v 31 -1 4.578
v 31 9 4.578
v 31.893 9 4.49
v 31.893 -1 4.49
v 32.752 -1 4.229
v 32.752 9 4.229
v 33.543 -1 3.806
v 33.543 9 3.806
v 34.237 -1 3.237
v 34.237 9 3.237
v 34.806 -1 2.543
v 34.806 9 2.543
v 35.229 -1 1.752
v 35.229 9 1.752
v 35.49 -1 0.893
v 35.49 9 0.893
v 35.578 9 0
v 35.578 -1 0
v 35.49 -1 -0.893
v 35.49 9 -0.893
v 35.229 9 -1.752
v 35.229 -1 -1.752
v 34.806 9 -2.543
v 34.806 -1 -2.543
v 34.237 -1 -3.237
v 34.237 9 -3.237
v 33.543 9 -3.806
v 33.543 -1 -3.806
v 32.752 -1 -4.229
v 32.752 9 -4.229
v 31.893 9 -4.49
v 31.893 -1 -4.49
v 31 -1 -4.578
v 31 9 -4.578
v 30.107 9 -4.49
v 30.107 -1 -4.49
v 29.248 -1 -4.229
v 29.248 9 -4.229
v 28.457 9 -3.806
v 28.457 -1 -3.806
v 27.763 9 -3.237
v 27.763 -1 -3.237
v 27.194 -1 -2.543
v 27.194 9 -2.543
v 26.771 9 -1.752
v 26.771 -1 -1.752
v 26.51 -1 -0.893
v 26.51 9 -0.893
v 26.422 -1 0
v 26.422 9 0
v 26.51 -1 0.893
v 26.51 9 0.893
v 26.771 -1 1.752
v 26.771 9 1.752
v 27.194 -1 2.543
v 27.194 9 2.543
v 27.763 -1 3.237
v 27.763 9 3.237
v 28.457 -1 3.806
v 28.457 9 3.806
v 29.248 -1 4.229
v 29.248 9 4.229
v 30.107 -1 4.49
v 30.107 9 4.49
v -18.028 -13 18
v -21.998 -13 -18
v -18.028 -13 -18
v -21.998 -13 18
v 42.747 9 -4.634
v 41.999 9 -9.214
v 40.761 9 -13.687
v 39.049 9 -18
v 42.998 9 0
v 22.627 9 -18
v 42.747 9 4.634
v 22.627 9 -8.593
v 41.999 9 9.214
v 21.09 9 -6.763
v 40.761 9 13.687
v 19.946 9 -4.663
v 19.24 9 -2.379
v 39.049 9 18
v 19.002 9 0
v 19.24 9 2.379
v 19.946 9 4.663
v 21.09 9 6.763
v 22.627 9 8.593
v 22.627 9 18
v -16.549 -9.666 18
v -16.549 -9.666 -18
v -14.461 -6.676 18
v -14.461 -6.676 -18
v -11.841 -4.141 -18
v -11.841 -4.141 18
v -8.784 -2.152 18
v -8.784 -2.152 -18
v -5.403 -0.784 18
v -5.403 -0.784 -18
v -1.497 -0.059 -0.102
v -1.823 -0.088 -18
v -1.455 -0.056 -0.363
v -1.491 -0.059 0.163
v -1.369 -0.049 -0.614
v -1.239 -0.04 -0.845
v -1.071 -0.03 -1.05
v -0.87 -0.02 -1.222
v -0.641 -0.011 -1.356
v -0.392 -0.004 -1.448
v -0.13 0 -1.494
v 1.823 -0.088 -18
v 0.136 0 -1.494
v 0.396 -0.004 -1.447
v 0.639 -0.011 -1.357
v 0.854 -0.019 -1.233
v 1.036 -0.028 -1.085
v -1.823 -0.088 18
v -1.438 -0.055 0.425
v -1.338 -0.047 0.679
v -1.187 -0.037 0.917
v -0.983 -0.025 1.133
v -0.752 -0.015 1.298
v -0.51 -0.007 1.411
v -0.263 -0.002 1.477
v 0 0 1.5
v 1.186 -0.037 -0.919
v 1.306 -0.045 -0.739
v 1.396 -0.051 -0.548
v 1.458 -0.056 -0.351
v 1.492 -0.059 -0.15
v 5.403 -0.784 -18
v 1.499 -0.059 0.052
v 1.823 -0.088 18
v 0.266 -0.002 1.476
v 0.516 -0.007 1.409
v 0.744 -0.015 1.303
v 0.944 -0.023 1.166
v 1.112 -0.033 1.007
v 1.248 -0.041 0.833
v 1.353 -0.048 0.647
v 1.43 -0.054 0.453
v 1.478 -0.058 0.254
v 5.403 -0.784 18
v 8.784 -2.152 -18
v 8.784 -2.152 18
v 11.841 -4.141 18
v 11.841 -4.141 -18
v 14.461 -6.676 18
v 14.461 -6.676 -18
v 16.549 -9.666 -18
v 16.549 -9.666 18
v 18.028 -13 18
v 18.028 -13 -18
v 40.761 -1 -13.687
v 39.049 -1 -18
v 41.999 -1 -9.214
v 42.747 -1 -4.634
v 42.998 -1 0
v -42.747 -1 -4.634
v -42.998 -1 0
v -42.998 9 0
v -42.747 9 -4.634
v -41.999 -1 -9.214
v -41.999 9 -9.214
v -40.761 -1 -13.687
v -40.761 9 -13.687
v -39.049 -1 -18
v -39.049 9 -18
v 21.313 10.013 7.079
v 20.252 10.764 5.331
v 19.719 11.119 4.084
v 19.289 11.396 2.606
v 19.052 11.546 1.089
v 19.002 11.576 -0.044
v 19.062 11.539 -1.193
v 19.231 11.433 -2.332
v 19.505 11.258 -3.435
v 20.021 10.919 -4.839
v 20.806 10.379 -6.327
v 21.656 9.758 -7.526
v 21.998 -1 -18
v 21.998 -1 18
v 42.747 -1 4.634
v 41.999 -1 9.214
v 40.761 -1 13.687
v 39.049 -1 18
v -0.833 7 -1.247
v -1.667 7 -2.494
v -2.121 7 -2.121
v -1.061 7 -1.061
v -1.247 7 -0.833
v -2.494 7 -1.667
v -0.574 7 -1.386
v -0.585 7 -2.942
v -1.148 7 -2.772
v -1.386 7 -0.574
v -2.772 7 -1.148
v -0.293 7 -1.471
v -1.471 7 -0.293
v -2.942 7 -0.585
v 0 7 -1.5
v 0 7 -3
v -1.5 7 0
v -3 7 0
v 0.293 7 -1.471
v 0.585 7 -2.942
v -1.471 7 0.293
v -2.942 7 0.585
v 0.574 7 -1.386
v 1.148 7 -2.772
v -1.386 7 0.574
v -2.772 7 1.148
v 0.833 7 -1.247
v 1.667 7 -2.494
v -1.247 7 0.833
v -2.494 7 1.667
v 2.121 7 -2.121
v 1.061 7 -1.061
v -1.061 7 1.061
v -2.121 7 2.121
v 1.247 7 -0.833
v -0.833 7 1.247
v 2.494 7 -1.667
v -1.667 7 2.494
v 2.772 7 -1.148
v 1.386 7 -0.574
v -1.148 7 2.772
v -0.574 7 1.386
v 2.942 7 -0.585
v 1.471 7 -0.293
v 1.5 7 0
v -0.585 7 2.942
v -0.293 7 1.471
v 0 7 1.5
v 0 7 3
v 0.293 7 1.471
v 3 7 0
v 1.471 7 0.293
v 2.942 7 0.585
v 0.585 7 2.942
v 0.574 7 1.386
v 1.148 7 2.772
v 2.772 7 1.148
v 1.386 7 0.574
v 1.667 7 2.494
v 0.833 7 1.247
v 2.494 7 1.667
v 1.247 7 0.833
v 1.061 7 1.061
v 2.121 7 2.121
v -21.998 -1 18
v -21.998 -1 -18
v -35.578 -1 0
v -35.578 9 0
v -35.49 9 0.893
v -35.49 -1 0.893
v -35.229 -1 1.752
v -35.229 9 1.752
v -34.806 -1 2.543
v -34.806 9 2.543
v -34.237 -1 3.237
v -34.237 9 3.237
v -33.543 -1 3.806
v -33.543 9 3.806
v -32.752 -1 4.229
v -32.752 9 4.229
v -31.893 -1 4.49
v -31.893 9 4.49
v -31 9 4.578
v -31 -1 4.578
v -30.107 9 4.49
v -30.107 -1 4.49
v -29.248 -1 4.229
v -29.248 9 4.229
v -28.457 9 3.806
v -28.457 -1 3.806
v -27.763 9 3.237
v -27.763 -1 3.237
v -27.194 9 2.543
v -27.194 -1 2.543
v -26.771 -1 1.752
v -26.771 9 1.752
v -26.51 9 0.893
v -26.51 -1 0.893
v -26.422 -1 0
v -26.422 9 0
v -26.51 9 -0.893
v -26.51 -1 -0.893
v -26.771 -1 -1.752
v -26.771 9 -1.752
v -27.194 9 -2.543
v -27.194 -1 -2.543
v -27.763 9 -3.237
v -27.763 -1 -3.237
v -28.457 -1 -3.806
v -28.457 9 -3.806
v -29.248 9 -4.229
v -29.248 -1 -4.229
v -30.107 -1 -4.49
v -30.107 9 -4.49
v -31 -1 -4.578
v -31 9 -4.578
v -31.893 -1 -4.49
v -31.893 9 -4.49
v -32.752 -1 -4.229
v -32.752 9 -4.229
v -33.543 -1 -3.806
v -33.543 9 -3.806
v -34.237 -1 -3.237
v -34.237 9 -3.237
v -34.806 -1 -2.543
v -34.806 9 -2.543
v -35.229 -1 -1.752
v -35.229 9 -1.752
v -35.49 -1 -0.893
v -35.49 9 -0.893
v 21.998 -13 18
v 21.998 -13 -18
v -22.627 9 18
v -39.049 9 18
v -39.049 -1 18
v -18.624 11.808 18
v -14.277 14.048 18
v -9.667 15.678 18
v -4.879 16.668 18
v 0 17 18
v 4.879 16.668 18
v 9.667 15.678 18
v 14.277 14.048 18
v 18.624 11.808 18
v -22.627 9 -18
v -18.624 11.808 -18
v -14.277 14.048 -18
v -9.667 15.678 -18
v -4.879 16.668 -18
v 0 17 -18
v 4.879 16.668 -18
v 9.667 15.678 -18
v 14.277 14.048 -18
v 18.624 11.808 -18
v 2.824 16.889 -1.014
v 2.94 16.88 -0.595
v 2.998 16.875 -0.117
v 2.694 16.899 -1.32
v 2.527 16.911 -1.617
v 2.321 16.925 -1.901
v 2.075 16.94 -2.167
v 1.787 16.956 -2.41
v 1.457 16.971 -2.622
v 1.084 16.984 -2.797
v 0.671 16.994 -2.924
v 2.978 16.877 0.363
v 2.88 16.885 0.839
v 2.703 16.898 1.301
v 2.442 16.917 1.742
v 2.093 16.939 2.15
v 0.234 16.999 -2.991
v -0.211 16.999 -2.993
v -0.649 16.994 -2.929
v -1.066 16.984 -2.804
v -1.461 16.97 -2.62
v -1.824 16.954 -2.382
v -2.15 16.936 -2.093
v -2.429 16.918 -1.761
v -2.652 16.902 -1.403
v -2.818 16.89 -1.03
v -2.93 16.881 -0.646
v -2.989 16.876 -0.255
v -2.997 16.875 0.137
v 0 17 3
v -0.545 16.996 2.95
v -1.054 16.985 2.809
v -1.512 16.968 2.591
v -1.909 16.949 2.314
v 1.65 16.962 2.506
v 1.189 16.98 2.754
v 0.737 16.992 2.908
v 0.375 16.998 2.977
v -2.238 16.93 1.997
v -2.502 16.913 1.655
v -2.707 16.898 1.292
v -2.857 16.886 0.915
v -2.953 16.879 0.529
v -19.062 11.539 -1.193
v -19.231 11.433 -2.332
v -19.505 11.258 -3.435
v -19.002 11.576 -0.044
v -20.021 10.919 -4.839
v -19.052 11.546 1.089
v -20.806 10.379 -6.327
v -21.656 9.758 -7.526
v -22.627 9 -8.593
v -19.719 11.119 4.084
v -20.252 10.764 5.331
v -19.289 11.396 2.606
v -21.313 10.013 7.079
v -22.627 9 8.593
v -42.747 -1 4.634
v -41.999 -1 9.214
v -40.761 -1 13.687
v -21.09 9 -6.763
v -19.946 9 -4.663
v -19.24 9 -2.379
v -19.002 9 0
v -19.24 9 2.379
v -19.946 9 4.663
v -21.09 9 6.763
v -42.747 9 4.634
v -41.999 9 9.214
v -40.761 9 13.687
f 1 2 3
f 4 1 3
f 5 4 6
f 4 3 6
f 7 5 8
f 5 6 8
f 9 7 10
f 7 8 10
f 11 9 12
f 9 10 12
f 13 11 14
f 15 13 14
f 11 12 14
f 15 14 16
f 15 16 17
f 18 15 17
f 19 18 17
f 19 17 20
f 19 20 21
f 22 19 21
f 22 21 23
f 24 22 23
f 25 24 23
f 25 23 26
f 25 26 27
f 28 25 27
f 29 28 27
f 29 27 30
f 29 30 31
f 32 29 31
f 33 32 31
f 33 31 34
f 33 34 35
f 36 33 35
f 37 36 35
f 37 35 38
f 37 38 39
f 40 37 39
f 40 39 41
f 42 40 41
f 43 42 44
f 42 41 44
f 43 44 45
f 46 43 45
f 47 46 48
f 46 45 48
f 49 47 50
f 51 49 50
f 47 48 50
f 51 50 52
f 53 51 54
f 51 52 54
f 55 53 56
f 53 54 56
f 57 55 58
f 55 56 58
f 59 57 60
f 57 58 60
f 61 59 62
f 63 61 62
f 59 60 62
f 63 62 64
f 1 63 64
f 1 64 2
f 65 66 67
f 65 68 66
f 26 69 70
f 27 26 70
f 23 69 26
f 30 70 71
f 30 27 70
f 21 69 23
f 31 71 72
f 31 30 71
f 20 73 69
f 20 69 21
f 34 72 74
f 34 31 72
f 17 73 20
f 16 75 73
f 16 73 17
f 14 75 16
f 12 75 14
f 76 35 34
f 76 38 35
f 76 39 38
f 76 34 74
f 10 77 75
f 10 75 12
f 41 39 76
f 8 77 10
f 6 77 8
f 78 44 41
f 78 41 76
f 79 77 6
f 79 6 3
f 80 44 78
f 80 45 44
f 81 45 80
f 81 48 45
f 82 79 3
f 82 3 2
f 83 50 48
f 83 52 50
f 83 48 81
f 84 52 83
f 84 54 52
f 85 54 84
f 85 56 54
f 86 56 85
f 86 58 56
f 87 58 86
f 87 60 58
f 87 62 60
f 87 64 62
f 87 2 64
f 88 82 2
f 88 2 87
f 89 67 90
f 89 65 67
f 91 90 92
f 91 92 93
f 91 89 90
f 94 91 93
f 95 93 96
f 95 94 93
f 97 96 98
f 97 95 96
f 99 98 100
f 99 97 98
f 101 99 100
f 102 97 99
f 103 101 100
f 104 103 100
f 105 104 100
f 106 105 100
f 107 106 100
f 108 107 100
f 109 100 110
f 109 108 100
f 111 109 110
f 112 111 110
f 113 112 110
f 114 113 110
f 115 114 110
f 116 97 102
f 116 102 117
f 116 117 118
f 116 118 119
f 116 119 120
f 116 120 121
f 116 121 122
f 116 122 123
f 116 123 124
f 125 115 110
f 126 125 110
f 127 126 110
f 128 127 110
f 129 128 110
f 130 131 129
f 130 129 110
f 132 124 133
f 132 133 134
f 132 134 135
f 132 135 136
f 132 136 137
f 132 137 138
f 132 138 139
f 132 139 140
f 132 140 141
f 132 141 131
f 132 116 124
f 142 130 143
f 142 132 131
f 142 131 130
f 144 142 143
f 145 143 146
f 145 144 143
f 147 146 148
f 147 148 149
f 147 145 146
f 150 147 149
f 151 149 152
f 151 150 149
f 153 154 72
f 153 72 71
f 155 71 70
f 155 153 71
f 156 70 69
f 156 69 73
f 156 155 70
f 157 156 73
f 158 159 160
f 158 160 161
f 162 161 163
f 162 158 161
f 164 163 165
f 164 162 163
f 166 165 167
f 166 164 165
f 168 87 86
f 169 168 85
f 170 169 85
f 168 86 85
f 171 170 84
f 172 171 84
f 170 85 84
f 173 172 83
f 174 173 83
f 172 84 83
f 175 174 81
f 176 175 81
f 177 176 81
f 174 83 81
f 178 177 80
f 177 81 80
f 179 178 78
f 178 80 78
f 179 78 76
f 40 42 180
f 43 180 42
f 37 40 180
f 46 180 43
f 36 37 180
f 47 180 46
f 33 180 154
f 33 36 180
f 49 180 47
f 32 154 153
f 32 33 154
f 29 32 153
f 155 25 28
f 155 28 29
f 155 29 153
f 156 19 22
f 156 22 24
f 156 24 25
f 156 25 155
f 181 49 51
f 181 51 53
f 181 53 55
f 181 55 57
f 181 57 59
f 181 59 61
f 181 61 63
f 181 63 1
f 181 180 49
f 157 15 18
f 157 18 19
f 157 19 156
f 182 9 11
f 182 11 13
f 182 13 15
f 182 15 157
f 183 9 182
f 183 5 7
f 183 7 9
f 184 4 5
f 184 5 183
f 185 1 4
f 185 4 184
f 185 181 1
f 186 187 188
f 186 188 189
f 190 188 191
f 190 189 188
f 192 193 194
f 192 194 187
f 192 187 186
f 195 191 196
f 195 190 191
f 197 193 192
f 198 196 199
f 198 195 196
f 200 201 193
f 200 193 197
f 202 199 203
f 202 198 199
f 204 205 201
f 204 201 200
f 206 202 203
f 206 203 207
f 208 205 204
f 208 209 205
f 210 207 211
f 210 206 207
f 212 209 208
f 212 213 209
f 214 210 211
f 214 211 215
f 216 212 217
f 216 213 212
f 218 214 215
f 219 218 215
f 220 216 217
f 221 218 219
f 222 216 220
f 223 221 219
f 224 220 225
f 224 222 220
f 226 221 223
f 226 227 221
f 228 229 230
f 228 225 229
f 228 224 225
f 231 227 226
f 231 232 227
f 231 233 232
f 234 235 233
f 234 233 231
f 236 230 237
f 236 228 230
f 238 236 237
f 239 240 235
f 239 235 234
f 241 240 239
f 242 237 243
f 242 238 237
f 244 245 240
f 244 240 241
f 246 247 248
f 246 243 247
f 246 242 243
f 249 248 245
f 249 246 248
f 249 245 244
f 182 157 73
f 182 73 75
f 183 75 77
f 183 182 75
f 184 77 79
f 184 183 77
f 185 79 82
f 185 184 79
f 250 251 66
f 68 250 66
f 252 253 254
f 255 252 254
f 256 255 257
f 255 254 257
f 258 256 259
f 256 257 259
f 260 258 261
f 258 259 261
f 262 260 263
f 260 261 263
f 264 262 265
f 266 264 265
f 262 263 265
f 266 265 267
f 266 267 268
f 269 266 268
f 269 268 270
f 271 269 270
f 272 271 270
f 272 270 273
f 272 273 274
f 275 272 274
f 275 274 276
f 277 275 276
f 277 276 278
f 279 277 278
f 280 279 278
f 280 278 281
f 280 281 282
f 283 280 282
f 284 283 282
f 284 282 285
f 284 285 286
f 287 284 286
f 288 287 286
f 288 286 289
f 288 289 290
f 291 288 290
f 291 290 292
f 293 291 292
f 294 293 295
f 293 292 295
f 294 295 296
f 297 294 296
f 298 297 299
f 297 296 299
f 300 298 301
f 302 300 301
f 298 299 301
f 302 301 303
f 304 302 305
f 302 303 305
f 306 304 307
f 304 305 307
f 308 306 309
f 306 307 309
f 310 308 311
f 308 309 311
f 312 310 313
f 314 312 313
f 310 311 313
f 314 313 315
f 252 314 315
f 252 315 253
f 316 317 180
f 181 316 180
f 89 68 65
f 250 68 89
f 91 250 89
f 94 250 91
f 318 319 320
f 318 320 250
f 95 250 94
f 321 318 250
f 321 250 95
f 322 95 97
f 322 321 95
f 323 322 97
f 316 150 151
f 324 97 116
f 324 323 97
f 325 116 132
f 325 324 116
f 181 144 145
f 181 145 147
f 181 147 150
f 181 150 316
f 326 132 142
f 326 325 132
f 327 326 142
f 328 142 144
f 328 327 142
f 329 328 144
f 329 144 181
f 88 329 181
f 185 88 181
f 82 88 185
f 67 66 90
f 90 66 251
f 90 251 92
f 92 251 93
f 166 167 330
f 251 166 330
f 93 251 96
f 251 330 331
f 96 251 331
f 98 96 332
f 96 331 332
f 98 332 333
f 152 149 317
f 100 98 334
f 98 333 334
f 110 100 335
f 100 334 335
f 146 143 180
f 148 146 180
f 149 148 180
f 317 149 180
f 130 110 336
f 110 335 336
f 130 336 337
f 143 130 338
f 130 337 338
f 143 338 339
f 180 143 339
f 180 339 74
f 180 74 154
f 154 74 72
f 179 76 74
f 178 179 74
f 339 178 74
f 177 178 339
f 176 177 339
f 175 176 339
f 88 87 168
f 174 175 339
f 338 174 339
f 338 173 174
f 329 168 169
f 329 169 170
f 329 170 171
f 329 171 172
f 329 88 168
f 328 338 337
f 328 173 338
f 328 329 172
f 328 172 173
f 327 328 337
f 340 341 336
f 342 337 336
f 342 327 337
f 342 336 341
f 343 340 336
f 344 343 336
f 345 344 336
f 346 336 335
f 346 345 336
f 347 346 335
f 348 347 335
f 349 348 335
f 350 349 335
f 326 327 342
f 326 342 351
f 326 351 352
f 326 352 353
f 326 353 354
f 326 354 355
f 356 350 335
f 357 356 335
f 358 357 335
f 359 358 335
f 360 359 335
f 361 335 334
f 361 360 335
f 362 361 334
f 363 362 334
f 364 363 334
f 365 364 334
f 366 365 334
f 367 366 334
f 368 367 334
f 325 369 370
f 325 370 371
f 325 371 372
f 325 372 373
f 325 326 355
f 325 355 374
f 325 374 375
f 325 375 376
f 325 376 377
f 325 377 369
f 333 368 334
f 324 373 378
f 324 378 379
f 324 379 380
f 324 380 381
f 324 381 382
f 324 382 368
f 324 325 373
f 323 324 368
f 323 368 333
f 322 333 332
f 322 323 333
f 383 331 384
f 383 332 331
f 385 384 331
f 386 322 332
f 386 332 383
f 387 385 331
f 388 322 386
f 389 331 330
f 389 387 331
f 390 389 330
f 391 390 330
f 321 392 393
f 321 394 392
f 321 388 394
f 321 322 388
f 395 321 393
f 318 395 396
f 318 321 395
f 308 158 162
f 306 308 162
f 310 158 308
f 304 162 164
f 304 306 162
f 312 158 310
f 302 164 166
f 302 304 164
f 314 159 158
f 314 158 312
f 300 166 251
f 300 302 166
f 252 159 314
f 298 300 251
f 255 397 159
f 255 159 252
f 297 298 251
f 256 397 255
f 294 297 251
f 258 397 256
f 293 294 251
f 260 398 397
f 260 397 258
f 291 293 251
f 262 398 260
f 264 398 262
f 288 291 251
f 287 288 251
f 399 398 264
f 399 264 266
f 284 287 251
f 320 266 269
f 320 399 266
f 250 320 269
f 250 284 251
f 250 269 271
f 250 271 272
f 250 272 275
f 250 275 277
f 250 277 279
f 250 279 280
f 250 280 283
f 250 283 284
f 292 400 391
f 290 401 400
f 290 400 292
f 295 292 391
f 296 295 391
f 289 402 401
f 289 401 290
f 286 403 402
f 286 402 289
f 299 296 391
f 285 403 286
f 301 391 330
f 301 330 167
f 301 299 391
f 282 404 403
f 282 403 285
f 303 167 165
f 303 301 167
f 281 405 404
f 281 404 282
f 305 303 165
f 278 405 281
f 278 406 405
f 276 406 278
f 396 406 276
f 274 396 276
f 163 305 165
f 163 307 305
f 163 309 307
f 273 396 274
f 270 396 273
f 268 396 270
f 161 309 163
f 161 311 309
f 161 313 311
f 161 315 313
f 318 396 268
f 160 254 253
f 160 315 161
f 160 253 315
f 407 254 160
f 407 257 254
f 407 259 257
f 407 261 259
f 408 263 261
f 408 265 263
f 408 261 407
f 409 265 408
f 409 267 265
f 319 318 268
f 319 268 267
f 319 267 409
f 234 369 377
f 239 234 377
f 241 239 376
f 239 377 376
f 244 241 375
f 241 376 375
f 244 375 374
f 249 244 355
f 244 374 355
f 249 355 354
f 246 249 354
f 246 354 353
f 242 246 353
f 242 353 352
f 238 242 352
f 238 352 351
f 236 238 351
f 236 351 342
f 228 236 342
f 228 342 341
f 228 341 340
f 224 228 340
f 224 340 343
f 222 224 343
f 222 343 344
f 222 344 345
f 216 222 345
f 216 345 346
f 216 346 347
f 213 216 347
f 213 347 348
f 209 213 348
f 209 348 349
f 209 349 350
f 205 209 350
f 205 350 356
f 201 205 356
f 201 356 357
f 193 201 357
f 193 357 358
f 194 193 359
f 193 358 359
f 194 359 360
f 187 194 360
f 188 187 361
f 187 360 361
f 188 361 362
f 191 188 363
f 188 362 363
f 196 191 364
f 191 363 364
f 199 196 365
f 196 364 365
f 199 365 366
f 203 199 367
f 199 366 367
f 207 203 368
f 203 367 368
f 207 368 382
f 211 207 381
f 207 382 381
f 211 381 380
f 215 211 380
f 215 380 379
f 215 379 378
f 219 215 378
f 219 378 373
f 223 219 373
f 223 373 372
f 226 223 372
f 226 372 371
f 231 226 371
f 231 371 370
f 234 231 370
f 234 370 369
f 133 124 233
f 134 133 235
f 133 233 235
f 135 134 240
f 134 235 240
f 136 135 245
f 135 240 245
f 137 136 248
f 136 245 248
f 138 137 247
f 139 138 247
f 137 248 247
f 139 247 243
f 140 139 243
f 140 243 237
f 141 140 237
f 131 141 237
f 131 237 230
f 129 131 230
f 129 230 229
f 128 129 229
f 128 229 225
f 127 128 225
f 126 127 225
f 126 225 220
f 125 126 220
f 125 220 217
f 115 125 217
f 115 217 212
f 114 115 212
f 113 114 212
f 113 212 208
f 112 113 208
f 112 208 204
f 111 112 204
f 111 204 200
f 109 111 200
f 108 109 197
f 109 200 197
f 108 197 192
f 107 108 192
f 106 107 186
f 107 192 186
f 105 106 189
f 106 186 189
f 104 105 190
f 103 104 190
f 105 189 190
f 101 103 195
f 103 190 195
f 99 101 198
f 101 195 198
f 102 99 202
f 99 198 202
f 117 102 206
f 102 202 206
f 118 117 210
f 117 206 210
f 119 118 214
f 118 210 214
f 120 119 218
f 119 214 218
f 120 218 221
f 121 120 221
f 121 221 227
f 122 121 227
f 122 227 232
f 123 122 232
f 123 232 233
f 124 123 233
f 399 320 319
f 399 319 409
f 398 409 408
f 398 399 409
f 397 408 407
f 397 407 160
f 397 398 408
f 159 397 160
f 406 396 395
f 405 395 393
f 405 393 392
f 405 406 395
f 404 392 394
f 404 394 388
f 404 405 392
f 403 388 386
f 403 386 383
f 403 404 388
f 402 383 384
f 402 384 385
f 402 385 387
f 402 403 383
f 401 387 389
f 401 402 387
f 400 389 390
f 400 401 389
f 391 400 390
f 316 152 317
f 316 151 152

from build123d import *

# Parameters (mm, degrees)
BOSS_EXTRUDE2_DEPTH     = 18
CUT_EXTRUDE1_START      = -10
CUT_EXTRUDE1_DEPTH      = 10
SKETCH4_R               = 4.577705579
CUT_EXTRUDE2_DEPTH      = 52.544224249
CUT_EXTRUDE3_DEPTH      = 52.544224249
SKETCH6_R               = 3
CUT_EXTRUDE4_DEPTH      = 10
CUT_EXTRUDE5_REACH      = 52.723
CUT_EXTRUDE5_END_RADIUS = 19
SKETCH7_R               = 1.5


# Read off the part's stored shape, not the designer's step: Cut-Extrude1
with BuildPart() as part:
    # Sketch1 → Boss-Extrude2 (new, symmetric)
    with BuildSketch(Plane.XY):
        with BuildLine():
            Line((18.027756377, -13), (21.997756377, -13))
            Line((21.997756377, -13), (21.997756377, -1))
            Line((21.997756377, -1), (42.997756377, -1))
            Line((42.997756377, -1), (42.997756377, 9))
            Line((42.997756377, 9), (22.627416998, 9))
            ThreePointArc((22.627416998, 9), (0, 17), (-22.627416998, 9))
            Line((-22.627416998, 9), (-42.997756377, 9))
            Line((-42.997756377, 9), (-42.997756377, -1))
            Line((-42.997756377, -1), (-21.997756377, -1))
            Line((-21.997756377, -1), (-21.997756377, -13))
            Line((-21.997756377, -13), (-18.027756377, -13))
            ThreePointArc((-18.027756377, -13), (0, 0), (18.027756377, -13))
        make_face()
    extrude(amount=BOSS_EXTRUDE2_DEPTH, both=True)

    # Cut-Extrude1 outline → Cut-Extrude1 (cut)
    with BuildSketch(Plane(origin=(0, 9, 0), x_dir=(1, 0, 0), z_dir=(0, 1, 0)).offset(CUT_EXTRUDE1_START)):
        with BuildLine():
            ThreePointArc((42.997756377, 0), (41.998910053, -9.214044053), (39.048777874, -18))
            Line((39.048777874, -18), (42.997756377, -18))
            Line((42.997756377, -18), (42.997756377, 0))
        make_face()
        with BuildLine():
            ThreePointArc((39.048777874, 18), (41.998910053, 9.214044053), (42.997756377, 0))
            Line((42.997756377, 0), (42.997756377, 18))
            Line((42.997756377, 18), (39.048777874, 18))
        make_face()
        with BuildLine():
            Line((-42.997756377, -18), (-39.048777874, -18))
            ThreePointArc((-39.048777874, -18), (-41.998910053, -9.214044053), (-42.997756377, 0))
            Line((-42.997756377, 0), (-42.997756377, -18))
        make_face()
        with BuildLine():
            Line((-42.997756377, 18), (-42.997756377, 0))
            ThreePointArc((-42.997756377, 0), (-41.998910053, 9.214044053), (-39.048777874, 18))
            Line((-39.048777874, 18), (-42.997756377, 18))
        make_face()
    extrude(amount=CUT_EXTRUDE1_DEPTH, mode=Mode.SUBTRACT)

    # Sketch4 → Cut-Extrude2 (cut, through all)
    with BuildSketch(Plane(origin=(0, 9, 0), x_dir=(1, 0, 0), z_dir=(0, 1, 0))):
        with Locations(Location((-31, 0, 0), (0, 0, 180))):
            Circle(SKETCH4_R)
        with Locations(Location((31, 0, 0), (0, 0, 270))):
            Circle(SKETCH4_R)
    extrude(amount=-CUT_EXTRUDE2_DEPTH, mode=Mode.SUBTRACT)

    # Sketch5 → Cut-Extrude3 (cut, through all)
    with BuildSketch(Plane(origin=(0, 9, 0), x_dir=(1, 0, 0), z_dir=(0, 1, 0))):
        with BuildLine():
            Line((-22.627416998, 8.593370233), (-22.627416998, -8.593370233))
            ThreePointArc((-22.627416998, -8.593370233), (-19.002243623, 0), (-22.627416998, 8.593370233))
        make_face()
        with BuildLine():
            Line((22.627416998, 8.593370233), (22.627416998, -8.593370233))
            ThreePointArc((22.627416998, -8.593370233), (19.002243623, 0), (22.627416998, 8.593370233))
        make_face()
    extrude(amount=CUT_EXTRUDE3_DEPTH, mode=Mode.SUBTRACT)

    # Sketch6 → Cut-Extrude4 (cut)
    with BuildSketch(Plane(origin=(0, 17, 0), x_dir=(1, 0, 0), z_dir=(0, 1, 0))):
        with Locations(Location((0, 0, 0), (0, 0, 270))):
            Circle(SKETCH6_R)
    extrude(amount=-CUT_EXTRUDE4_DEPTH, mode=Mode.SUBTRACT)

    # Cut-Extrude5: up to this cylinder (the profile starts outside it)
    cut_extrude5_end = Plane(origin=(0, -19, 0), z_dir=(0, 0, -1)) * Cylinder(CUT_EXTRUDE5_END_RADIUS, 144.446, mode=Mode.PRIVATE)
    # Sketch7 → Cut-Extrude5 (cut, up to the surface)
    with BuildSketch(Plane(origin=(0, 7, 0), x_dir=(1, 0, 0), z_dir=(0, 1, 0)), mode=Mode.PRIVATE) as cut_extrude5_sk1:
        with Locations(Location((0, 0, 0), (0, 0, 270))):
            Circle(SKETCH7_R)
    cut_extrude5_tool1 = extrude(cut_extrude5_sk1.sketch, amount=-CUT_EXTRUDE5_REACH, mode=Mode.PRIVATE) - cut_extrude5_end
    add(cut_extrude5_tool1.solids().sort_by_distance((0, 7, 0))[0], mode=Mode.SUBTRACT)


solid = part.part
